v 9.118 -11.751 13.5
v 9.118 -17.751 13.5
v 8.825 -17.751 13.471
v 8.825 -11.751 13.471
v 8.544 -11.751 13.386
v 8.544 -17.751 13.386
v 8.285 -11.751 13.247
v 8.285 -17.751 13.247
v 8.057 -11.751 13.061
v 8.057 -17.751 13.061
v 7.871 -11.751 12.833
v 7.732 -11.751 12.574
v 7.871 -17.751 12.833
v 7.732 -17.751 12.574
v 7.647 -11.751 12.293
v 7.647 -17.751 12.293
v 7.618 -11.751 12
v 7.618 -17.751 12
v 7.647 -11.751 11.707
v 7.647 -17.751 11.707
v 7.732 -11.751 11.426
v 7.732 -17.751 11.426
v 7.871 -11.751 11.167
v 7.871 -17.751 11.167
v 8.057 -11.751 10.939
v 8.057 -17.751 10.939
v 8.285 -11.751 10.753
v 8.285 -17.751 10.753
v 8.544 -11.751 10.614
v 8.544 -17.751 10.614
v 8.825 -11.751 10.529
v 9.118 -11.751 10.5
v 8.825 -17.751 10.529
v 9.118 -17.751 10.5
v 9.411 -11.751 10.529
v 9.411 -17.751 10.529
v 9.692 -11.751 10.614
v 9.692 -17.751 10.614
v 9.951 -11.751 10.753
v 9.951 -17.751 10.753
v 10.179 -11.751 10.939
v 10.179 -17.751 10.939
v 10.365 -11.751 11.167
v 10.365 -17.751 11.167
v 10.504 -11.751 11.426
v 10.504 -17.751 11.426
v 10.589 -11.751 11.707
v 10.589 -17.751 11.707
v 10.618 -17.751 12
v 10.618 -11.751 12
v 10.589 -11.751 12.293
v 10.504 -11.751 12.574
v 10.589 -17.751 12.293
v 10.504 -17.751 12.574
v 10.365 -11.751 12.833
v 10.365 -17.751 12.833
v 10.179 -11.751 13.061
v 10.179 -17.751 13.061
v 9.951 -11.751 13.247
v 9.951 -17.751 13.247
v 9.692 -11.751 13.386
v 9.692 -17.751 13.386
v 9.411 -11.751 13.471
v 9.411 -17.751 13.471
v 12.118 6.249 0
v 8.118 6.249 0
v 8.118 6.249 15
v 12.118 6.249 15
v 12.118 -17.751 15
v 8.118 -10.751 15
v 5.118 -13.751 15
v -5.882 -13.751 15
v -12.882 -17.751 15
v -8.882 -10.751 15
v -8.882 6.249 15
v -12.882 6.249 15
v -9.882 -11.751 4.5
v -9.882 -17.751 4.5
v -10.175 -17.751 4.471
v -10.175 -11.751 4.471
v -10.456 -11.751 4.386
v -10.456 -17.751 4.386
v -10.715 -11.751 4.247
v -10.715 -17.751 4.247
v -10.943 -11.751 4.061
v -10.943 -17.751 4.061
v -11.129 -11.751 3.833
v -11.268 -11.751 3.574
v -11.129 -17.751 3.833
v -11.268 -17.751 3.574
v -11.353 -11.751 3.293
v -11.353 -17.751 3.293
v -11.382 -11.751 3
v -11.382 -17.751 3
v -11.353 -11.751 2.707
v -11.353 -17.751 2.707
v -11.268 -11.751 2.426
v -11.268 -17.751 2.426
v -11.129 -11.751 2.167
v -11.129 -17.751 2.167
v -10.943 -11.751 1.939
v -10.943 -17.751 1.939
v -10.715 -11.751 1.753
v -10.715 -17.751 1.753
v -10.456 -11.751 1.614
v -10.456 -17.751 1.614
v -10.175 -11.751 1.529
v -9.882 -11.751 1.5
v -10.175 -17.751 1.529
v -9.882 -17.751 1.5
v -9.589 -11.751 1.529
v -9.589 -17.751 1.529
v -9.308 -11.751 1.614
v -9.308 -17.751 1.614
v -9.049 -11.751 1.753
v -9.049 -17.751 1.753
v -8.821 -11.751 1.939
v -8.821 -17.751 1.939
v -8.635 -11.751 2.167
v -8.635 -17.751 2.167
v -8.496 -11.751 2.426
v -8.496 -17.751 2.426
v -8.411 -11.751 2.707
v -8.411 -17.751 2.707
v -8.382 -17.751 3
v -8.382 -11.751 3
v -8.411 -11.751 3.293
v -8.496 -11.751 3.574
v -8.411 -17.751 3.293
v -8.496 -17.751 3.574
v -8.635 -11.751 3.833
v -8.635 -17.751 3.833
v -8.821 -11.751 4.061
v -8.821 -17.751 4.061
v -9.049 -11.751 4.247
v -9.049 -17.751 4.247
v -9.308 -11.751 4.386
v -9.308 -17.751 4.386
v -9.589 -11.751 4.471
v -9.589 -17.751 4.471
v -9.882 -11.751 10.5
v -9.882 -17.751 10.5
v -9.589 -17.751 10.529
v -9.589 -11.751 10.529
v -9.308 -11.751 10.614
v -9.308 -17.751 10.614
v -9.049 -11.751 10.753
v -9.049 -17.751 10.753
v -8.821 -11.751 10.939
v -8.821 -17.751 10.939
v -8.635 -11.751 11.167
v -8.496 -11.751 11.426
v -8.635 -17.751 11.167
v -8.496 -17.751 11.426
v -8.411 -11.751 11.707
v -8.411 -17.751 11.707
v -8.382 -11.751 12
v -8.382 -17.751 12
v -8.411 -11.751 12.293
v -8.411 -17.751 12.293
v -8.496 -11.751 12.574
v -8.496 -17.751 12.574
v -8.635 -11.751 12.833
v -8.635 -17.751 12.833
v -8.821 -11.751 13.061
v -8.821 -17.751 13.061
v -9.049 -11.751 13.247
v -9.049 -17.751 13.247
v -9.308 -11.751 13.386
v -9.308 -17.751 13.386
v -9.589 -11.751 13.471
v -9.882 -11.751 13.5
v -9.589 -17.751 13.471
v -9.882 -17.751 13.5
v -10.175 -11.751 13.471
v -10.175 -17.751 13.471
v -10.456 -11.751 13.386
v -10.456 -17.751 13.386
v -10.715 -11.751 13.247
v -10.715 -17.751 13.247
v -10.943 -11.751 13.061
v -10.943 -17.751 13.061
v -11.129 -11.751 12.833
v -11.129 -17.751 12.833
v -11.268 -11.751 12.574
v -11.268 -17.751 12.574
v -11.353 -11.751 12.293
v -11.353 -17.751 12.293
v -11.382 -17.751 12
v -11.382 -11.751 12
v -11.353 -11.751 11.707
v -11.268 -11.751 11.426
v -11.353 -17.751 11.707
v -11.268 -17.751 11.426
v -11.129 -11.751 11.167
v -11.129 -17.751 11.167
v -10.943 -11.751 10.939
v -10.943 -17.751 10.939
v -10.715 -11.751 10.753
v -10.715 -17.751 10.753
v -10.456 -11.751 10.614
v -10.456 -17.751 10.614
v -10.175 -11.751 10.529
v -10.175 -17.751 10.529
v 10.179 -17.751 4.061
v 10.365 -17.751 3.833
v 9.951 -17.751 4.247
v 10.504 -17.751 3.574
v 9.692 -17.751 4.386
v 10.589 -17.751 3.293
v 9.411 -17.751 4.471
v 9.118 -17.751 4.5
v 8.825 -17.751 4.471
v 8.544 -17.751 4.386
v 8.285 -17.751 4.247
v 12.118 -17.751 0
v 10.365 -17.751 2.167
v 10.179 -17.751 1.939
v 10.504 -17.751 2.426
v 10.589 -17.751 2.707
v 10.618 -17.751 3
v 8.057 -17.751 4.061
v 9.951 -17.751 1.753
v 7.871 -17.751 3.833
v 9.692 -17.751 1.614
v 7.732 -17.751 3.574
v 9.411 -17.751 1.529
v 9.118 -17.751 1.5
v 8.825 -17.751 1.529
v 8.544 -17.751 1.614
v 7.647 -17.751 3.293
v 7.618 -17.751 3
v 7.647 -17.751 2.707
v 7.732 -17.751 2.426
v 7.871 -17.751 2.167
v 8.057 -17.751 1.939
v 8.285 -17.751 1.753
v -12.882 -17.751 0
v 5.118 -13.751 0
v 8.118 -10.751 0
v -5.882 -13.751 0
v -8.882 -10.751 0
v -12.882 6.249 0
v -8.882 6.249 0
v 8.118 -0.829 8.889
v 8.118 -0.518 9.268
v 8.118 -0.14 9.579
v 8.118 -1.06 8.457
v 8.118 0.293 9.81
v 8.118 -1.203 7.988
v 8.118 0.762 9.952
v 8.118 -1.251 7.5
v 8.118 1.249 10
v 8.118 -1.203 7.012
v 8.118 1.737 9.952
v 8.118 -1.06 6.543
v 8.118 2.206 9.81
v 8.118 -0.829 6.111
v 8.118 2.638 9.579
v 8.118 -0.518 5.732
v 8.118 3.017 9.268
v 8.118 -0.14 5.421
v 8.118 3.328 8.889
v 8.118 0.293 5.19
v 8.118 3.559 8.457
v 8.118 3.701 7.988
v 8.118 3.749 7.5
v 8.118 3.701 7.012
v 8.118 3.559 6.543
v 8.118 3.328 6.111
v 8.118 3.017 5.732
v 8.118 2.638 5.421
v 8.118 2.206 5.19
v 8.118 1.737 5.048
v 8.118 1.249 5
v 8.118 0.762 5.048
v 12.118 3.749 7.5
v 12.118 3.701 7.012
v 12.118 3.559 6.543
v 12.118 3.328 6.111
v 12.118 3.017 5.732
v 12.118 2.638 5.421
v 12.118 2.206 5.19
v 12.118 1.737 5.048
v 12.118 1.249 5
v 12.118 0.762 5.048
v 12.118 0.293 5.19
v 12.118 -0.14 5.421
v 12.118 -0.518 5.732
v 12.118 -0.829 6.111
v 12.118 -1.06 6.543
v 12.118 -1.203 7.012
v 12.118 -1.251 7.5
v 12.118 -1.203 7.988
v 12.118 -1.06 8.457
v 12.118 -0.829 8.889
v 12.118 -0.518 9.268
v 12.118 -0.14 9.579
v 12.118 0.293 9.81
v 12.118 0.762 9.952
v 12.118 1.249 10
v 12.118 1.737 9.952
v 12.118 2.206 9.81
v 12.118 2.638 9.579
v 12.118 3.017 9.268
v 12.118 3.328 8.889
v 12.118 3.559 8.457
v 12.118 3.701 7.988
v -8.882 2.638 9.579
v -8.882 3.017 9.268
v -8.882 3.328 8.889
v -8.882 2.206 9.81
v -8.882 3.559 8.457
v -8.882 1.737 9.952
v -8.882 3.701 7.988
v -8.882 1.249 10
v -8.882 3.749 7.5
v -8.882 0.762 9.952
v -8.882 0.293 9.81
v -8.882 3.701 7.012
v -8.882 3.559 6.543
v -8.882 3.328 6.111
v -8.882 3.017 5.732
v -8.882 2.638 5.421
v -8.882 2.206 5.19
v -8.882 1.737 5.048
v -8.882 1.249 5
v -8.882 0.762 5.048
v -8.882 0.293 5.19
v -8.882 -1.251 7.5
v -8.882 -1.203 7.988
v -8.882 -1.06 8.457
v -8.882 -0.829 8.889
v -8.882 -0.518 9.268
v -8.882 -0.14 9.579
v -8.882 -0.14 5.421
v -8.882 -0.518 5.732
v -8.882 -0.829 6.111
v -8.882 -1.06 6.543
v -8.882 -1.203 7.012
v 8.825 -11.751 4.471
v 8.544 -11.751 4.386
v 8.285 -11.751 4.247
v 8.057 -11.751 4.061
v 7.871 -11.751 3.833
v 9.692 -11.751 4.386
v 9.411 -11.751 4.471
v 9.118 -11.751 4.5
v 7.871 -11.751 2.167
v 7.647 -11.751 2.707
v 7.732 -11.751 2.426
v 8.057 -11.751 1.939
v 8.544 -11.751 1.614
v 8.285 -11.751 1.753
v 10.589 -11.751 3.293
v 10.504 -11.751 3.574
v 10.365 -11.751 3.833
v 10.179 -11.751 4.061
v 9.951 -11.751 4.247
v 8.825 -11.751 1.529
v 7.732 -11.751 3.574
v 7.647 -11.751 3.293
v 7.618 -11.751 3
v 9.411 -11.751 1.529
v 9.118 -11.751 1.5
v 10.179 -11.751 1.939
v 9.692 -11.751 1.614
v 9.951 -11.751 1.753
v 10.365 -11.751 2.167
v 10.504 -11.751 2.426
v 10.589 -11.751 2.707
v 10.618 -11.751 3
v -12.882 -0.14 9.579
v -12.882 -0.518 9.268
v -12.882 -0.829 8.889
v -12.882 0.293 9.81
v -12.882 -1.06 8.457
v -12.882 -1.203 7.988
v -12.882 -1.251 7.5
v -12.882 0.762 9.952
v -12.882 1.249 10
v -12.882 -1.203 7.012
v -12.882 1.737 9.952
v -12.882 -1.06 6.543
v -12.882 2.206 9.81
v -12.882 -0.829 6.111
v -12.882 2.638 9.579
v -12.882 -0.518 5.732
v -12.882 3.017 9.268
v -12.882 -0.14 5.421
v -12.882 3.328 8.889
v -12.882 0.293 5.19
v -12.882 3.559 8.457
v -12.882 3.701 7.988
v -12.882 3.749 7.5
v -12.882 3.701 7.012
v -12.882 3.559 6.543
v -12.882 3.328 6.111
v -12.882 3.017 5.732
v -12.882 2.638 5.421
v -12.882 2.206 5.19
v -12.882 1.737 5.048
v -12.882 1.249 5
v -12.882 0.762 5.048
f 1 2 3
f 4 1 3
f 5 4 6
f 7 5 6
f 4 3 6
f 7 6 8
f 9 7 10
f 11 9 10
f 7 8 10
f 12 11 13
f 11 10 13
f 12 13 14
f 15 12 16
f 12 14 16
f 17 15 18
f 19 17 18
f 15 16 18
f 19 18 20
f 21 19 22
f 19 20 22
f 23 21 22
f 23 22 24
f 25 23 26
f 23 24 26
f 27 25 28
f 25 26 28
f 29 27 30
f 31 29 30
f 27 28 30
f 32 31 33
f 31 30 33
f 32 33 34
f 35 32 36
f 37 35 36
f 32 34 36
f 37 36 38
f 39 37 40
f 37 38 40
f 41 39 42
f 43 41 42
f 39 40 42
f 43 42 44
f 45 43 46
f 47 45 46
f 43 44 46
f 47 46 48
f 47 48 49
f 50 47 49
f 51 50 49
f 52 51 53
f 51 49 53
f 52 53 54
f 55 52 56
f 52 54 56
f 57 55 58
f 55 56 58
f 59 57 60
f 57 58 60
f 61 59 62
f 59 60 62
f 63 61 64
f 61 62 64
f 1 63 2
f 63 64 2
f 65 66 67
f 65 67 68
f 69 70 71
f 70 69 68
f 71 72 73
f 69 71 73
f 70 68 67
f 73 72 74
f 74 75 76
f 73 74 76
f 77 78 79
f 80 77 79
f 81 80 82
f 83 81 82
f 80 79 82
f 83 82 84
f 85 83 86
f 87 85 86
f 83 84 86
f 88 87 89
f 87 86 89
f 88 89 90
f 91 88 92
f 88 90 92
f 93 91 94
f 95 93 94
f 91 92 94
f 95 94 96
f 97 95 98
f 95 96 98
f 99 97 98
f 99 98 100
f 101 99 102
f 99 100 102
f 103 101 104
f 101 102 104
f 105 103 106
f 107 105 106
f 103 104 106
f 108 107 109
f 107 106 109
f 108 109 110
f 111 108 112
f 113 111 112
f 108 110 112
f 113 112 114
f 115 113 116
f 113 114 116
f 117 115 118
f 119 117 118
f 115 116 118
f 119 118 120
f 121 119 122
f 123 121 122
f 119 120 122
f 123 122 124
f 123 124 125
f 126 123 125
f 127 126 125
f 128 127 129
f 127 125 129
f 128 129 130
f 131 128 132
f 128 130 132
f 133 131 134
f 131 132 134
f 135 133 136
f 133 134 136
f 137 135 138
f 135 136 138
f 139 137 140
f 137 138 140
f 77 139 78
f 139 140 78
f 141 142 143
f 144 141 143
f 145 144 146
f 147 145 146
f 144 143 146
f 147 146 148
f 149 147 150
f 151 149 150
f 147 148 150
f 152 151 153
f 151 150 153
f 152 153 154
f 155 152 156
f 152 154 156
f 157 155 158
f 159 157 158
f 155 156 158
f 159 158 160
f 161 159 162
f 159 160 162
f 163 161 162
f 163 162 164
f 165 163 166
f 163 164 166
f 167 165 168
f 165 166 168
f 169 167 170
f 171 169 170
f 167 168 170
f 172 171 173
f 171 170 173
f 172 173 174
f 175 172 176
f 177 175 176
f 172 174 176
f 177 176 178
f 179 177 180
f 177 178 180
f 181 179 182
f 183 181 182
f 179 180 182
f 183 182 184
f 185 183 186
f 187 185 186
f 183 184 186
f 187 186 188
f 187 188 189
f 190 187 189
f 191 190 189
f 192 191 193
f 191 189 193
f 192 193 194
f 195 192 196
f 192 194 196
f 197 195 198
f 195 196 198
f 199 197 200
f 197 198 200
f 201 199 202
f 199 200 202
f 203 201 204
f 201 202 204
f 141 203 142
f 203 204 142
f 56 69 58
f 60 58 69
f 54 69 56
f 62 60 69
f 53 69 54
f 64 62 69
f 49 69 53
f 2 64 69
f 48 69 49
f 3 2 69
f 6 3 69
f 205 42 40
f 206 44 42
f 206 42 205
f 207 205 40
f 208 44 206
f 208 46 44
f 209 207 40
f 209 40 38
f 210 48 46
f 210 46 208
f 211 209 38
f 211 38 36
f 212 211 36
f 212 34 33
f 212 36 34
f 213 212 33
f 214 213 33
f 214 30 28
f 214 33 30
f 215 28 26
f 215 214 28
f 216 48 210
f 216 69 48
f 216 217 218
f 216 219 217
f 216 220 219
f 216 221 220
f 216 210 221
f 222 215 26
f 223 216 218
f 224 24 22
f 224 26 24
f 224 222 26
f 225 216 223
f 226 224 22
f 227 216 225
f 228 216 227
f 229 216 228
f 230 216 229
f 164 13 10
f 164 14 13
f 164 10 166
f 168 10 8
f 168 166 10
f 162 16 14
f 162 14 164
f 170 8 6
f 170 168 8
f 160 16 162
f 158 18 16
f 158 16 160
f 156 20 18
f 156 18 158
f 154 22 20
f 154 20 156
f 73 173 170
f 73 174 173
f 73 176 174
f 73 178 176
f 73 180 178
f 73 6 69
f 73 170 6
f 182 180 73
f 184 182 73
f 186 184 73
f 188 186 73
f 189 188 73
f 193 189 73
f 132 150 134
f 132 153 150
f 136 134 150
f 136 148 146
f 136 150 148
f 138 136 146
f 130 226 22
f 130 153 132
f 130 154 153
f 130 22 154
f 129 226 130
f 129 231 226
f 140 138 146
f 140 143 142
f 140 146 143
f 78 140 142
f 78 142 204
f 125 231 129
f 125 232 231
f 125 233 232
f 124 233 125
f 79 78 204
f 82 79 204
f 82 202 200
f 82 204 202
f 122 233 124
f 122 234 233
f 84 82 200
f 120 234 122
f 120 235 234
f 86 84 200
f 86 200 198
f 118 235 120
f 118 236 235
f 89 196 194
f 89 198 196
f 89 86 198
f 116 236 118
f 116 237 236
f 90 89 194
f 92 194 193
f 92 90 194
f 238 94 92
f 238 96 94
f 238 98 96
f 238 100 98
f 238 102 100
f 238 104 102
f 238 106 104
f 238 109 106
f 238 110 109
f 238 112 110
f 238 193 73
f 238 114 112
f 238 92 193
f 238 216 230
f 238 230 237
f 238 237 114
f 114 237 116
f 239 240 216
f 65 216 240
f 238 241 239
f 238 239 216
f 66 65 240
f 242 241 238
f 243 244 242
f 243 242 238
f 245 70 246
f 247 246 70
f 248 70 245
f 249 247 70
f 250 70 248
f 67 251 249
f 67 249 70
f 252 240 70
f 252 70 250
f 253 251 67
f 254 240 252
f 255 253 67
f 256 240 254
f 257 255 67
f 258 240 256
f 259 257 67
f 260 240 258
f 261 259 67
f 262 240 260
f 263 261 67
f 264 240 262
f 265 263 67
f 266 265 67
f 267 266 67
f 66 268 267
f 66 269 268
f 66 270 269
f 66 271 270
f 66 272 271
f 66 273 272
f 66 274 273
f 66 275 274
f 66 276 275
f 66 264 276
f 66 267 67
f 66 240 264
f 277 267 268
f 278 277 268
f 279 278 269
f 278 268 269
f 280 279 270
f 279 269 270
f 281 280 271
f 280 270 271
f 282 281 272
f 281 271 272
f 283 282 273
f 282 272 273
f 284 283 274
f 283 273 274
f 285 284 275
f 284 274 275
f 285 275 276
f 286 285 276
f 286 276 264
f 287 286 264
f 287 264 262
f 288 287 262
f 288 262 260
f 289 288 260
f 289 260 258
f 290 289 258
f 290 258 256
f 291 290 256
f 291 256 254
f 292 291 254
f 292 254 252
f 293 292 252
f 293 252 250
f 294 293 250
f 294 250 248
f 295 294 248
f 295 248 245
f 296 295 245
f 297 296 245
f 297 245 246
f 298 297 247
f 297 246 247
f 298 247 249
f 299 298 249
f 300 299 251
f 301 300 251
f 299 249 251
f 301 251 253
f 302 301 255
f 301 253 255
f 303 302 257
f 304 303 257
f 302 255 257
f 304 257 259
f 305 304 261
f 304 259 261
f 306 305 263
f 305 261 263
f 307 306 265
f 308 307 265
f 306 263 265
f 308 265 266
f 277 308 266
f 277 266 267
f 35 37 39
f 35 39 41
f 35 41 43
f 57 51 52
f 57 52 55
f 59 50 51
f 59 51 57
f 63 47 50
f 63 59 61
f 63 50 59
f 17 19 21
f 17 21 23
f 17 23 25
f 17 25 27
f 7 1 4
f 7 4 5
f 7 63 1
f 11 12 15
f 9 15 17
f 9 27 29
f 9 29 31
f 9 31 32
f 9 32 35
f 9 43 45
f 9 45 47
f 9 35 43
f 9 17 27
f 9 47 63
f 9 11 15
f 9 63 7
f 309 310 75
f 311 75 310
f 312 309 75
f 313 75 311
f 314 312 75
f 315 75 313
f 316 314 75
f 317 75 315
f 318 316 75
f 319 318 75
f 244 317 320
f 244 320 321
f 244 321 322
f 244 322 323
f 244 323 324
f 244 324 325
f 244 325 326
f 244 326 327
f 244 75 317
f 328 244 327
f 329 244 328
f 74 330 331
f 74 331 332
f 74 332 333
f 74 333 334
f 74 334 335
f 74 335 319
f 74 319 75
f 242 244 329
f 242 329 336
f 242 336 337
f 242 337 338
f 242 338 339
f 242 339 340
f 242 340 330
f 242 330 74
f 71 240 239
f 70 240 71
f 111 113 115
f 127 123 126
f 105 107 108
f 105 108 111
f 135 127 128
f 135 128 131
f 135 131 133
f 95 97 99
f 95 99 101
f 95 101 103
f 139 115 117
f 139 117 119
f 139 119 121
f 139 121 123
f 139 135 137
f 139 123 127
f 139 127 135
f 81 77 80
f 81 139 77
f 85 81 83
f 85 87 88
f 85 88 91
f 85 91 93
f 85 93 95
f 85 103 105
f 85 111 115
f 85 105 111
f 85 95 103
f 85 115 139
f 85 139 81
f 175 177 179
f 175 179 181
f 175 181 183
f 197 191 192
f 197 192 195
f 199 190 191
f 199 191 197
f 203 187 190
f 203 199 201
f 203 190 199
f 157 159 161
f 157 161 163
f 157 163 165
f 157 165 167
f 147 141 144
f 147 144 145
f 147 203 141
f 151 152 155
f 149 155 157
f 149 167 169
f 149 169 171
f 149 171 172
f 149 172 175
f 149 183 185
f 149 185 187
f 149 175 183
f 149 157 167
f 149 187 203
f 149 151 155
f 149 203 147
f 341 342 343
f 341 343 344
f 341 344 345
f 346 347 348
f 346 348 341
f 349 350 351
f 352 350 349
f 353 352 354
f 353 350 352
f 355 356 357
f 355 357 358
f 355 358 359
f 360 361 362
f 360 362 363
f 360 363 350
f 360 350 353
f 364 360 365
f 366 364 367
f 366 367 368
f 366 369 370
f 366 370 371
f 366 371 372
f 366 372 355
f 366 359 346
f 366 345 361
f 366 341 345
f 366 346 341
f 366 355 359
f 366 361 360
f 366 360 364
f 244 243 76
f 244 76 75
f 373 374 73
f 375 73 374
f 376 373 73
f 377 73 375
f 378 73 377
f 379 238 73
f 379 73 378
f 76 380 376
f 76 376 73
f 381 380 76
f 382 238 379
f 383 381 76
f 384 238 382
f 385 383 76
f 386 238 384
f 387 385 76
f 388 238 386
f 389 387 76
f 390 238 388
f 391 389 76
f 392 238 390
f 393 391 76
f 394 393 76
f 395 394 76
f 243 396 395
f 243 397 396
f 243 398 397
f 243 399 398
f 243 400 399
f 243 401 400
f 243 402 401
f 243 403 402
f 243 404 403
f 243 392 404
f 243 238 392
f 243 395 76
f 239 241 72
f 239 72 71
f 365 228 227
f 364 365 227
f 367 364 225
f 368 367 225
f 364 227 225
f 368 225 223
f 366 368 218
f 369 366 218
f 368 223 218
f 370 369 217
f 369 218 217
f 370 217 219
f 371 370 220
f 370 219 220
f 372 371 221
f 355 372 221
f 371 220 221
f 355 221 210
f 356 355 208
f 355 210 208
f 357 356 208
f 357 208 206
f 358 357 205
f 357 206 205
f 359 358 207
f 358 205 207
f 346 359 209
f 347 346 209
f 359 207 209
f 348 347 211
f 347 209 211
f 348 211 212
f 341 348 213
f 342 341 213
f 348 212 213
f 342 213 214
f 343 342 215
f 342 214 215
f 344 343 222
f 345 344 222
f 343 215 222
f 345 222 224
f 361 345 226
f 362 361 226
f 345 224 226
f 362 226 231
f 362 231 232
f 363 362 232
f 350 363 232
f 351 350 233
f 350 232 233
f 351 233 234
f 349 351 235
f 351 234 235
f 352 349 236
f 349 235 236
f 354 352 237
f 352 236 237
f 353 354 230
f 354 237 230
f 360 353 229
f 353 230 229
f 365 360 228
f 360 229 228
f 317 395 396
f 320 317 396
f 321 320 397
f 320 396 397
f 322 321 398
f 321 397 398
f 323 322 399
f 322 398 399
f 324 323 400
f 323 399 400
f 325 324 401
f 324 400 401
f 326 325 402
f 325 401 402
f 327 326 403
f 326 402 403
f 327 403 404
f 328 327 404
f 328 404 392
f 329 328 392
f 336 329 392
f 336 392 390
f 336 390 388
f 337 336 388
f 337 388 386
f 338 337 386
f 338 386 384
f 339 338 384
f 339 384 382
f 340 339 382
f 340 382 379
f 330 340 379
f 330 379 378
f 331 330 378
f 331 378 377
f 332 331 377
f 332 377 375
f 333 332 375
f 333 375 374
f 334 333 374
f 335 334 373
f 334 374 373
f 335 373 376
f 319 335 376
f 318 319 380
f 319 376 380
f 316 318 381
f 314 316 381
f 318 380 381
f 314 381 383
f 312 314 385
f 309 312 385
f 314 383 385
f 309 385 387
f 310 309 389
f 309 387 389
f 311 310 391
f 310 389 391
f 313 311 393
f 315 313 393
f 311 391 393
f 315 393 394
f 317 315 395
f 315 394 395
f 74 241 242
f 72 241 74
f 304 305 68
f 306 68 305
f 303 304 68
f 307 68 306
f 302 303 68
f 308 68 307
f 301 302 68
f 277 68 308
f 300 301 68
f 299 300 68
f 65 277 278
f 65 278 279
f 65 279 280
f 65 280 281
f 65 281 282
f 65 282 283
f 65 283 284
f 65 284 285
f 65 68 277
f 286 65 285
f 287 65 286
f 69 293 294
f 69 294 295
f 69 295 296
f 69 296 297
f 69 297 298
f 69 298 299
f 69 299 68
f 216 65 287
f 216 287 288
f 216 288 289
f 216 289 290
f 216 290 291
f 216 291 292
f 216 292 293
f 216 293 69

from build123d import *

# Parameters (mm, degrees)
BOSS_EXTRUDE1_DEPTH = 15
CHAMFER1_SIZE       = 3
CHAMFER2_SIZE       = 3
SKETCH2_R           = 2.5
CUT_EXTRUDE1_DEPTH  = 37
SKETCH3_R           = 1.5
CUT_EXTRUDE2_DEPTH  = 6


with BuildPart() as part:
    # Sketch1 → Boss-Extrude1 (new body)
    with BuildSketch(Plane.XY):
        Polygon((8.117882489, 6.249295775), (12.117882489, 6.249295775), (12.117882489, -17.750704225), (-12.882117511, -17.750704225), (-12.882117511, 6.249295775), (-8.882117511, 6.249295775), (-8.882117511, -13.750704225), (8.117882489, -13.750704225), align=None)
    extrude(amount=BOSS_EXTRUDE1_DEPTH)

    # Chamfer1
    chamfer1_edges = [part.edges().sort_by_distance(p)[0] for p in [
        (-8.882117511, -13.750704225, 7.5),
    ]]
    chamfer(chamfer1_edges, length=CHAMFER1_SIZE)

    # Chamfer2
    chamfer2_edges = [part.edges().sort_by_distance(p)[0] for p in [
        (8.117882489, -13.750704225, 7.5),
    ]]
    chamfer(chamfer2_edges, length=CHAMFER2_SIZE)

    # Sketch2 → Cut-Extrude1 (cut)
    with BuildSketch(Plane.ZY.offset(12.882117511)):
        with Locations(Location((7.5, 1.249295775, 0), (0, 0, 90))):
            Circle(SKETCH2_R)
    extrude(amount=-CUT_EXTRUDE1_DEPTH, mode=Mode.SUBTRACT)

    # Sketch3 → Cut-Extrude2 (cut)
    with BuildSketch(Plane.XZ.offset(17.750704225)):
        with Locations(Location((-9.882117511, 12, 0), (0, 0, 270))):
            Circle(SKETCH3_R)
        with Locations(Location((-9.882117511, 3, 0), (0, 0, 90))):
            Circle(SKETCH3_R)
        with Locations(Location((9.117882489, 12, 0), (0, 0, 90))):
            Circle(SKETCH3_R)
        with Locations(Location((9.117882489, 3, 0), (0, 0, 270))):
            Circle(SKETCH3_R)
    extrude(amount=-CUT_EXTRUDE2_DEPTH, mode=Mode.SUBTRACT)


solid = part.part
